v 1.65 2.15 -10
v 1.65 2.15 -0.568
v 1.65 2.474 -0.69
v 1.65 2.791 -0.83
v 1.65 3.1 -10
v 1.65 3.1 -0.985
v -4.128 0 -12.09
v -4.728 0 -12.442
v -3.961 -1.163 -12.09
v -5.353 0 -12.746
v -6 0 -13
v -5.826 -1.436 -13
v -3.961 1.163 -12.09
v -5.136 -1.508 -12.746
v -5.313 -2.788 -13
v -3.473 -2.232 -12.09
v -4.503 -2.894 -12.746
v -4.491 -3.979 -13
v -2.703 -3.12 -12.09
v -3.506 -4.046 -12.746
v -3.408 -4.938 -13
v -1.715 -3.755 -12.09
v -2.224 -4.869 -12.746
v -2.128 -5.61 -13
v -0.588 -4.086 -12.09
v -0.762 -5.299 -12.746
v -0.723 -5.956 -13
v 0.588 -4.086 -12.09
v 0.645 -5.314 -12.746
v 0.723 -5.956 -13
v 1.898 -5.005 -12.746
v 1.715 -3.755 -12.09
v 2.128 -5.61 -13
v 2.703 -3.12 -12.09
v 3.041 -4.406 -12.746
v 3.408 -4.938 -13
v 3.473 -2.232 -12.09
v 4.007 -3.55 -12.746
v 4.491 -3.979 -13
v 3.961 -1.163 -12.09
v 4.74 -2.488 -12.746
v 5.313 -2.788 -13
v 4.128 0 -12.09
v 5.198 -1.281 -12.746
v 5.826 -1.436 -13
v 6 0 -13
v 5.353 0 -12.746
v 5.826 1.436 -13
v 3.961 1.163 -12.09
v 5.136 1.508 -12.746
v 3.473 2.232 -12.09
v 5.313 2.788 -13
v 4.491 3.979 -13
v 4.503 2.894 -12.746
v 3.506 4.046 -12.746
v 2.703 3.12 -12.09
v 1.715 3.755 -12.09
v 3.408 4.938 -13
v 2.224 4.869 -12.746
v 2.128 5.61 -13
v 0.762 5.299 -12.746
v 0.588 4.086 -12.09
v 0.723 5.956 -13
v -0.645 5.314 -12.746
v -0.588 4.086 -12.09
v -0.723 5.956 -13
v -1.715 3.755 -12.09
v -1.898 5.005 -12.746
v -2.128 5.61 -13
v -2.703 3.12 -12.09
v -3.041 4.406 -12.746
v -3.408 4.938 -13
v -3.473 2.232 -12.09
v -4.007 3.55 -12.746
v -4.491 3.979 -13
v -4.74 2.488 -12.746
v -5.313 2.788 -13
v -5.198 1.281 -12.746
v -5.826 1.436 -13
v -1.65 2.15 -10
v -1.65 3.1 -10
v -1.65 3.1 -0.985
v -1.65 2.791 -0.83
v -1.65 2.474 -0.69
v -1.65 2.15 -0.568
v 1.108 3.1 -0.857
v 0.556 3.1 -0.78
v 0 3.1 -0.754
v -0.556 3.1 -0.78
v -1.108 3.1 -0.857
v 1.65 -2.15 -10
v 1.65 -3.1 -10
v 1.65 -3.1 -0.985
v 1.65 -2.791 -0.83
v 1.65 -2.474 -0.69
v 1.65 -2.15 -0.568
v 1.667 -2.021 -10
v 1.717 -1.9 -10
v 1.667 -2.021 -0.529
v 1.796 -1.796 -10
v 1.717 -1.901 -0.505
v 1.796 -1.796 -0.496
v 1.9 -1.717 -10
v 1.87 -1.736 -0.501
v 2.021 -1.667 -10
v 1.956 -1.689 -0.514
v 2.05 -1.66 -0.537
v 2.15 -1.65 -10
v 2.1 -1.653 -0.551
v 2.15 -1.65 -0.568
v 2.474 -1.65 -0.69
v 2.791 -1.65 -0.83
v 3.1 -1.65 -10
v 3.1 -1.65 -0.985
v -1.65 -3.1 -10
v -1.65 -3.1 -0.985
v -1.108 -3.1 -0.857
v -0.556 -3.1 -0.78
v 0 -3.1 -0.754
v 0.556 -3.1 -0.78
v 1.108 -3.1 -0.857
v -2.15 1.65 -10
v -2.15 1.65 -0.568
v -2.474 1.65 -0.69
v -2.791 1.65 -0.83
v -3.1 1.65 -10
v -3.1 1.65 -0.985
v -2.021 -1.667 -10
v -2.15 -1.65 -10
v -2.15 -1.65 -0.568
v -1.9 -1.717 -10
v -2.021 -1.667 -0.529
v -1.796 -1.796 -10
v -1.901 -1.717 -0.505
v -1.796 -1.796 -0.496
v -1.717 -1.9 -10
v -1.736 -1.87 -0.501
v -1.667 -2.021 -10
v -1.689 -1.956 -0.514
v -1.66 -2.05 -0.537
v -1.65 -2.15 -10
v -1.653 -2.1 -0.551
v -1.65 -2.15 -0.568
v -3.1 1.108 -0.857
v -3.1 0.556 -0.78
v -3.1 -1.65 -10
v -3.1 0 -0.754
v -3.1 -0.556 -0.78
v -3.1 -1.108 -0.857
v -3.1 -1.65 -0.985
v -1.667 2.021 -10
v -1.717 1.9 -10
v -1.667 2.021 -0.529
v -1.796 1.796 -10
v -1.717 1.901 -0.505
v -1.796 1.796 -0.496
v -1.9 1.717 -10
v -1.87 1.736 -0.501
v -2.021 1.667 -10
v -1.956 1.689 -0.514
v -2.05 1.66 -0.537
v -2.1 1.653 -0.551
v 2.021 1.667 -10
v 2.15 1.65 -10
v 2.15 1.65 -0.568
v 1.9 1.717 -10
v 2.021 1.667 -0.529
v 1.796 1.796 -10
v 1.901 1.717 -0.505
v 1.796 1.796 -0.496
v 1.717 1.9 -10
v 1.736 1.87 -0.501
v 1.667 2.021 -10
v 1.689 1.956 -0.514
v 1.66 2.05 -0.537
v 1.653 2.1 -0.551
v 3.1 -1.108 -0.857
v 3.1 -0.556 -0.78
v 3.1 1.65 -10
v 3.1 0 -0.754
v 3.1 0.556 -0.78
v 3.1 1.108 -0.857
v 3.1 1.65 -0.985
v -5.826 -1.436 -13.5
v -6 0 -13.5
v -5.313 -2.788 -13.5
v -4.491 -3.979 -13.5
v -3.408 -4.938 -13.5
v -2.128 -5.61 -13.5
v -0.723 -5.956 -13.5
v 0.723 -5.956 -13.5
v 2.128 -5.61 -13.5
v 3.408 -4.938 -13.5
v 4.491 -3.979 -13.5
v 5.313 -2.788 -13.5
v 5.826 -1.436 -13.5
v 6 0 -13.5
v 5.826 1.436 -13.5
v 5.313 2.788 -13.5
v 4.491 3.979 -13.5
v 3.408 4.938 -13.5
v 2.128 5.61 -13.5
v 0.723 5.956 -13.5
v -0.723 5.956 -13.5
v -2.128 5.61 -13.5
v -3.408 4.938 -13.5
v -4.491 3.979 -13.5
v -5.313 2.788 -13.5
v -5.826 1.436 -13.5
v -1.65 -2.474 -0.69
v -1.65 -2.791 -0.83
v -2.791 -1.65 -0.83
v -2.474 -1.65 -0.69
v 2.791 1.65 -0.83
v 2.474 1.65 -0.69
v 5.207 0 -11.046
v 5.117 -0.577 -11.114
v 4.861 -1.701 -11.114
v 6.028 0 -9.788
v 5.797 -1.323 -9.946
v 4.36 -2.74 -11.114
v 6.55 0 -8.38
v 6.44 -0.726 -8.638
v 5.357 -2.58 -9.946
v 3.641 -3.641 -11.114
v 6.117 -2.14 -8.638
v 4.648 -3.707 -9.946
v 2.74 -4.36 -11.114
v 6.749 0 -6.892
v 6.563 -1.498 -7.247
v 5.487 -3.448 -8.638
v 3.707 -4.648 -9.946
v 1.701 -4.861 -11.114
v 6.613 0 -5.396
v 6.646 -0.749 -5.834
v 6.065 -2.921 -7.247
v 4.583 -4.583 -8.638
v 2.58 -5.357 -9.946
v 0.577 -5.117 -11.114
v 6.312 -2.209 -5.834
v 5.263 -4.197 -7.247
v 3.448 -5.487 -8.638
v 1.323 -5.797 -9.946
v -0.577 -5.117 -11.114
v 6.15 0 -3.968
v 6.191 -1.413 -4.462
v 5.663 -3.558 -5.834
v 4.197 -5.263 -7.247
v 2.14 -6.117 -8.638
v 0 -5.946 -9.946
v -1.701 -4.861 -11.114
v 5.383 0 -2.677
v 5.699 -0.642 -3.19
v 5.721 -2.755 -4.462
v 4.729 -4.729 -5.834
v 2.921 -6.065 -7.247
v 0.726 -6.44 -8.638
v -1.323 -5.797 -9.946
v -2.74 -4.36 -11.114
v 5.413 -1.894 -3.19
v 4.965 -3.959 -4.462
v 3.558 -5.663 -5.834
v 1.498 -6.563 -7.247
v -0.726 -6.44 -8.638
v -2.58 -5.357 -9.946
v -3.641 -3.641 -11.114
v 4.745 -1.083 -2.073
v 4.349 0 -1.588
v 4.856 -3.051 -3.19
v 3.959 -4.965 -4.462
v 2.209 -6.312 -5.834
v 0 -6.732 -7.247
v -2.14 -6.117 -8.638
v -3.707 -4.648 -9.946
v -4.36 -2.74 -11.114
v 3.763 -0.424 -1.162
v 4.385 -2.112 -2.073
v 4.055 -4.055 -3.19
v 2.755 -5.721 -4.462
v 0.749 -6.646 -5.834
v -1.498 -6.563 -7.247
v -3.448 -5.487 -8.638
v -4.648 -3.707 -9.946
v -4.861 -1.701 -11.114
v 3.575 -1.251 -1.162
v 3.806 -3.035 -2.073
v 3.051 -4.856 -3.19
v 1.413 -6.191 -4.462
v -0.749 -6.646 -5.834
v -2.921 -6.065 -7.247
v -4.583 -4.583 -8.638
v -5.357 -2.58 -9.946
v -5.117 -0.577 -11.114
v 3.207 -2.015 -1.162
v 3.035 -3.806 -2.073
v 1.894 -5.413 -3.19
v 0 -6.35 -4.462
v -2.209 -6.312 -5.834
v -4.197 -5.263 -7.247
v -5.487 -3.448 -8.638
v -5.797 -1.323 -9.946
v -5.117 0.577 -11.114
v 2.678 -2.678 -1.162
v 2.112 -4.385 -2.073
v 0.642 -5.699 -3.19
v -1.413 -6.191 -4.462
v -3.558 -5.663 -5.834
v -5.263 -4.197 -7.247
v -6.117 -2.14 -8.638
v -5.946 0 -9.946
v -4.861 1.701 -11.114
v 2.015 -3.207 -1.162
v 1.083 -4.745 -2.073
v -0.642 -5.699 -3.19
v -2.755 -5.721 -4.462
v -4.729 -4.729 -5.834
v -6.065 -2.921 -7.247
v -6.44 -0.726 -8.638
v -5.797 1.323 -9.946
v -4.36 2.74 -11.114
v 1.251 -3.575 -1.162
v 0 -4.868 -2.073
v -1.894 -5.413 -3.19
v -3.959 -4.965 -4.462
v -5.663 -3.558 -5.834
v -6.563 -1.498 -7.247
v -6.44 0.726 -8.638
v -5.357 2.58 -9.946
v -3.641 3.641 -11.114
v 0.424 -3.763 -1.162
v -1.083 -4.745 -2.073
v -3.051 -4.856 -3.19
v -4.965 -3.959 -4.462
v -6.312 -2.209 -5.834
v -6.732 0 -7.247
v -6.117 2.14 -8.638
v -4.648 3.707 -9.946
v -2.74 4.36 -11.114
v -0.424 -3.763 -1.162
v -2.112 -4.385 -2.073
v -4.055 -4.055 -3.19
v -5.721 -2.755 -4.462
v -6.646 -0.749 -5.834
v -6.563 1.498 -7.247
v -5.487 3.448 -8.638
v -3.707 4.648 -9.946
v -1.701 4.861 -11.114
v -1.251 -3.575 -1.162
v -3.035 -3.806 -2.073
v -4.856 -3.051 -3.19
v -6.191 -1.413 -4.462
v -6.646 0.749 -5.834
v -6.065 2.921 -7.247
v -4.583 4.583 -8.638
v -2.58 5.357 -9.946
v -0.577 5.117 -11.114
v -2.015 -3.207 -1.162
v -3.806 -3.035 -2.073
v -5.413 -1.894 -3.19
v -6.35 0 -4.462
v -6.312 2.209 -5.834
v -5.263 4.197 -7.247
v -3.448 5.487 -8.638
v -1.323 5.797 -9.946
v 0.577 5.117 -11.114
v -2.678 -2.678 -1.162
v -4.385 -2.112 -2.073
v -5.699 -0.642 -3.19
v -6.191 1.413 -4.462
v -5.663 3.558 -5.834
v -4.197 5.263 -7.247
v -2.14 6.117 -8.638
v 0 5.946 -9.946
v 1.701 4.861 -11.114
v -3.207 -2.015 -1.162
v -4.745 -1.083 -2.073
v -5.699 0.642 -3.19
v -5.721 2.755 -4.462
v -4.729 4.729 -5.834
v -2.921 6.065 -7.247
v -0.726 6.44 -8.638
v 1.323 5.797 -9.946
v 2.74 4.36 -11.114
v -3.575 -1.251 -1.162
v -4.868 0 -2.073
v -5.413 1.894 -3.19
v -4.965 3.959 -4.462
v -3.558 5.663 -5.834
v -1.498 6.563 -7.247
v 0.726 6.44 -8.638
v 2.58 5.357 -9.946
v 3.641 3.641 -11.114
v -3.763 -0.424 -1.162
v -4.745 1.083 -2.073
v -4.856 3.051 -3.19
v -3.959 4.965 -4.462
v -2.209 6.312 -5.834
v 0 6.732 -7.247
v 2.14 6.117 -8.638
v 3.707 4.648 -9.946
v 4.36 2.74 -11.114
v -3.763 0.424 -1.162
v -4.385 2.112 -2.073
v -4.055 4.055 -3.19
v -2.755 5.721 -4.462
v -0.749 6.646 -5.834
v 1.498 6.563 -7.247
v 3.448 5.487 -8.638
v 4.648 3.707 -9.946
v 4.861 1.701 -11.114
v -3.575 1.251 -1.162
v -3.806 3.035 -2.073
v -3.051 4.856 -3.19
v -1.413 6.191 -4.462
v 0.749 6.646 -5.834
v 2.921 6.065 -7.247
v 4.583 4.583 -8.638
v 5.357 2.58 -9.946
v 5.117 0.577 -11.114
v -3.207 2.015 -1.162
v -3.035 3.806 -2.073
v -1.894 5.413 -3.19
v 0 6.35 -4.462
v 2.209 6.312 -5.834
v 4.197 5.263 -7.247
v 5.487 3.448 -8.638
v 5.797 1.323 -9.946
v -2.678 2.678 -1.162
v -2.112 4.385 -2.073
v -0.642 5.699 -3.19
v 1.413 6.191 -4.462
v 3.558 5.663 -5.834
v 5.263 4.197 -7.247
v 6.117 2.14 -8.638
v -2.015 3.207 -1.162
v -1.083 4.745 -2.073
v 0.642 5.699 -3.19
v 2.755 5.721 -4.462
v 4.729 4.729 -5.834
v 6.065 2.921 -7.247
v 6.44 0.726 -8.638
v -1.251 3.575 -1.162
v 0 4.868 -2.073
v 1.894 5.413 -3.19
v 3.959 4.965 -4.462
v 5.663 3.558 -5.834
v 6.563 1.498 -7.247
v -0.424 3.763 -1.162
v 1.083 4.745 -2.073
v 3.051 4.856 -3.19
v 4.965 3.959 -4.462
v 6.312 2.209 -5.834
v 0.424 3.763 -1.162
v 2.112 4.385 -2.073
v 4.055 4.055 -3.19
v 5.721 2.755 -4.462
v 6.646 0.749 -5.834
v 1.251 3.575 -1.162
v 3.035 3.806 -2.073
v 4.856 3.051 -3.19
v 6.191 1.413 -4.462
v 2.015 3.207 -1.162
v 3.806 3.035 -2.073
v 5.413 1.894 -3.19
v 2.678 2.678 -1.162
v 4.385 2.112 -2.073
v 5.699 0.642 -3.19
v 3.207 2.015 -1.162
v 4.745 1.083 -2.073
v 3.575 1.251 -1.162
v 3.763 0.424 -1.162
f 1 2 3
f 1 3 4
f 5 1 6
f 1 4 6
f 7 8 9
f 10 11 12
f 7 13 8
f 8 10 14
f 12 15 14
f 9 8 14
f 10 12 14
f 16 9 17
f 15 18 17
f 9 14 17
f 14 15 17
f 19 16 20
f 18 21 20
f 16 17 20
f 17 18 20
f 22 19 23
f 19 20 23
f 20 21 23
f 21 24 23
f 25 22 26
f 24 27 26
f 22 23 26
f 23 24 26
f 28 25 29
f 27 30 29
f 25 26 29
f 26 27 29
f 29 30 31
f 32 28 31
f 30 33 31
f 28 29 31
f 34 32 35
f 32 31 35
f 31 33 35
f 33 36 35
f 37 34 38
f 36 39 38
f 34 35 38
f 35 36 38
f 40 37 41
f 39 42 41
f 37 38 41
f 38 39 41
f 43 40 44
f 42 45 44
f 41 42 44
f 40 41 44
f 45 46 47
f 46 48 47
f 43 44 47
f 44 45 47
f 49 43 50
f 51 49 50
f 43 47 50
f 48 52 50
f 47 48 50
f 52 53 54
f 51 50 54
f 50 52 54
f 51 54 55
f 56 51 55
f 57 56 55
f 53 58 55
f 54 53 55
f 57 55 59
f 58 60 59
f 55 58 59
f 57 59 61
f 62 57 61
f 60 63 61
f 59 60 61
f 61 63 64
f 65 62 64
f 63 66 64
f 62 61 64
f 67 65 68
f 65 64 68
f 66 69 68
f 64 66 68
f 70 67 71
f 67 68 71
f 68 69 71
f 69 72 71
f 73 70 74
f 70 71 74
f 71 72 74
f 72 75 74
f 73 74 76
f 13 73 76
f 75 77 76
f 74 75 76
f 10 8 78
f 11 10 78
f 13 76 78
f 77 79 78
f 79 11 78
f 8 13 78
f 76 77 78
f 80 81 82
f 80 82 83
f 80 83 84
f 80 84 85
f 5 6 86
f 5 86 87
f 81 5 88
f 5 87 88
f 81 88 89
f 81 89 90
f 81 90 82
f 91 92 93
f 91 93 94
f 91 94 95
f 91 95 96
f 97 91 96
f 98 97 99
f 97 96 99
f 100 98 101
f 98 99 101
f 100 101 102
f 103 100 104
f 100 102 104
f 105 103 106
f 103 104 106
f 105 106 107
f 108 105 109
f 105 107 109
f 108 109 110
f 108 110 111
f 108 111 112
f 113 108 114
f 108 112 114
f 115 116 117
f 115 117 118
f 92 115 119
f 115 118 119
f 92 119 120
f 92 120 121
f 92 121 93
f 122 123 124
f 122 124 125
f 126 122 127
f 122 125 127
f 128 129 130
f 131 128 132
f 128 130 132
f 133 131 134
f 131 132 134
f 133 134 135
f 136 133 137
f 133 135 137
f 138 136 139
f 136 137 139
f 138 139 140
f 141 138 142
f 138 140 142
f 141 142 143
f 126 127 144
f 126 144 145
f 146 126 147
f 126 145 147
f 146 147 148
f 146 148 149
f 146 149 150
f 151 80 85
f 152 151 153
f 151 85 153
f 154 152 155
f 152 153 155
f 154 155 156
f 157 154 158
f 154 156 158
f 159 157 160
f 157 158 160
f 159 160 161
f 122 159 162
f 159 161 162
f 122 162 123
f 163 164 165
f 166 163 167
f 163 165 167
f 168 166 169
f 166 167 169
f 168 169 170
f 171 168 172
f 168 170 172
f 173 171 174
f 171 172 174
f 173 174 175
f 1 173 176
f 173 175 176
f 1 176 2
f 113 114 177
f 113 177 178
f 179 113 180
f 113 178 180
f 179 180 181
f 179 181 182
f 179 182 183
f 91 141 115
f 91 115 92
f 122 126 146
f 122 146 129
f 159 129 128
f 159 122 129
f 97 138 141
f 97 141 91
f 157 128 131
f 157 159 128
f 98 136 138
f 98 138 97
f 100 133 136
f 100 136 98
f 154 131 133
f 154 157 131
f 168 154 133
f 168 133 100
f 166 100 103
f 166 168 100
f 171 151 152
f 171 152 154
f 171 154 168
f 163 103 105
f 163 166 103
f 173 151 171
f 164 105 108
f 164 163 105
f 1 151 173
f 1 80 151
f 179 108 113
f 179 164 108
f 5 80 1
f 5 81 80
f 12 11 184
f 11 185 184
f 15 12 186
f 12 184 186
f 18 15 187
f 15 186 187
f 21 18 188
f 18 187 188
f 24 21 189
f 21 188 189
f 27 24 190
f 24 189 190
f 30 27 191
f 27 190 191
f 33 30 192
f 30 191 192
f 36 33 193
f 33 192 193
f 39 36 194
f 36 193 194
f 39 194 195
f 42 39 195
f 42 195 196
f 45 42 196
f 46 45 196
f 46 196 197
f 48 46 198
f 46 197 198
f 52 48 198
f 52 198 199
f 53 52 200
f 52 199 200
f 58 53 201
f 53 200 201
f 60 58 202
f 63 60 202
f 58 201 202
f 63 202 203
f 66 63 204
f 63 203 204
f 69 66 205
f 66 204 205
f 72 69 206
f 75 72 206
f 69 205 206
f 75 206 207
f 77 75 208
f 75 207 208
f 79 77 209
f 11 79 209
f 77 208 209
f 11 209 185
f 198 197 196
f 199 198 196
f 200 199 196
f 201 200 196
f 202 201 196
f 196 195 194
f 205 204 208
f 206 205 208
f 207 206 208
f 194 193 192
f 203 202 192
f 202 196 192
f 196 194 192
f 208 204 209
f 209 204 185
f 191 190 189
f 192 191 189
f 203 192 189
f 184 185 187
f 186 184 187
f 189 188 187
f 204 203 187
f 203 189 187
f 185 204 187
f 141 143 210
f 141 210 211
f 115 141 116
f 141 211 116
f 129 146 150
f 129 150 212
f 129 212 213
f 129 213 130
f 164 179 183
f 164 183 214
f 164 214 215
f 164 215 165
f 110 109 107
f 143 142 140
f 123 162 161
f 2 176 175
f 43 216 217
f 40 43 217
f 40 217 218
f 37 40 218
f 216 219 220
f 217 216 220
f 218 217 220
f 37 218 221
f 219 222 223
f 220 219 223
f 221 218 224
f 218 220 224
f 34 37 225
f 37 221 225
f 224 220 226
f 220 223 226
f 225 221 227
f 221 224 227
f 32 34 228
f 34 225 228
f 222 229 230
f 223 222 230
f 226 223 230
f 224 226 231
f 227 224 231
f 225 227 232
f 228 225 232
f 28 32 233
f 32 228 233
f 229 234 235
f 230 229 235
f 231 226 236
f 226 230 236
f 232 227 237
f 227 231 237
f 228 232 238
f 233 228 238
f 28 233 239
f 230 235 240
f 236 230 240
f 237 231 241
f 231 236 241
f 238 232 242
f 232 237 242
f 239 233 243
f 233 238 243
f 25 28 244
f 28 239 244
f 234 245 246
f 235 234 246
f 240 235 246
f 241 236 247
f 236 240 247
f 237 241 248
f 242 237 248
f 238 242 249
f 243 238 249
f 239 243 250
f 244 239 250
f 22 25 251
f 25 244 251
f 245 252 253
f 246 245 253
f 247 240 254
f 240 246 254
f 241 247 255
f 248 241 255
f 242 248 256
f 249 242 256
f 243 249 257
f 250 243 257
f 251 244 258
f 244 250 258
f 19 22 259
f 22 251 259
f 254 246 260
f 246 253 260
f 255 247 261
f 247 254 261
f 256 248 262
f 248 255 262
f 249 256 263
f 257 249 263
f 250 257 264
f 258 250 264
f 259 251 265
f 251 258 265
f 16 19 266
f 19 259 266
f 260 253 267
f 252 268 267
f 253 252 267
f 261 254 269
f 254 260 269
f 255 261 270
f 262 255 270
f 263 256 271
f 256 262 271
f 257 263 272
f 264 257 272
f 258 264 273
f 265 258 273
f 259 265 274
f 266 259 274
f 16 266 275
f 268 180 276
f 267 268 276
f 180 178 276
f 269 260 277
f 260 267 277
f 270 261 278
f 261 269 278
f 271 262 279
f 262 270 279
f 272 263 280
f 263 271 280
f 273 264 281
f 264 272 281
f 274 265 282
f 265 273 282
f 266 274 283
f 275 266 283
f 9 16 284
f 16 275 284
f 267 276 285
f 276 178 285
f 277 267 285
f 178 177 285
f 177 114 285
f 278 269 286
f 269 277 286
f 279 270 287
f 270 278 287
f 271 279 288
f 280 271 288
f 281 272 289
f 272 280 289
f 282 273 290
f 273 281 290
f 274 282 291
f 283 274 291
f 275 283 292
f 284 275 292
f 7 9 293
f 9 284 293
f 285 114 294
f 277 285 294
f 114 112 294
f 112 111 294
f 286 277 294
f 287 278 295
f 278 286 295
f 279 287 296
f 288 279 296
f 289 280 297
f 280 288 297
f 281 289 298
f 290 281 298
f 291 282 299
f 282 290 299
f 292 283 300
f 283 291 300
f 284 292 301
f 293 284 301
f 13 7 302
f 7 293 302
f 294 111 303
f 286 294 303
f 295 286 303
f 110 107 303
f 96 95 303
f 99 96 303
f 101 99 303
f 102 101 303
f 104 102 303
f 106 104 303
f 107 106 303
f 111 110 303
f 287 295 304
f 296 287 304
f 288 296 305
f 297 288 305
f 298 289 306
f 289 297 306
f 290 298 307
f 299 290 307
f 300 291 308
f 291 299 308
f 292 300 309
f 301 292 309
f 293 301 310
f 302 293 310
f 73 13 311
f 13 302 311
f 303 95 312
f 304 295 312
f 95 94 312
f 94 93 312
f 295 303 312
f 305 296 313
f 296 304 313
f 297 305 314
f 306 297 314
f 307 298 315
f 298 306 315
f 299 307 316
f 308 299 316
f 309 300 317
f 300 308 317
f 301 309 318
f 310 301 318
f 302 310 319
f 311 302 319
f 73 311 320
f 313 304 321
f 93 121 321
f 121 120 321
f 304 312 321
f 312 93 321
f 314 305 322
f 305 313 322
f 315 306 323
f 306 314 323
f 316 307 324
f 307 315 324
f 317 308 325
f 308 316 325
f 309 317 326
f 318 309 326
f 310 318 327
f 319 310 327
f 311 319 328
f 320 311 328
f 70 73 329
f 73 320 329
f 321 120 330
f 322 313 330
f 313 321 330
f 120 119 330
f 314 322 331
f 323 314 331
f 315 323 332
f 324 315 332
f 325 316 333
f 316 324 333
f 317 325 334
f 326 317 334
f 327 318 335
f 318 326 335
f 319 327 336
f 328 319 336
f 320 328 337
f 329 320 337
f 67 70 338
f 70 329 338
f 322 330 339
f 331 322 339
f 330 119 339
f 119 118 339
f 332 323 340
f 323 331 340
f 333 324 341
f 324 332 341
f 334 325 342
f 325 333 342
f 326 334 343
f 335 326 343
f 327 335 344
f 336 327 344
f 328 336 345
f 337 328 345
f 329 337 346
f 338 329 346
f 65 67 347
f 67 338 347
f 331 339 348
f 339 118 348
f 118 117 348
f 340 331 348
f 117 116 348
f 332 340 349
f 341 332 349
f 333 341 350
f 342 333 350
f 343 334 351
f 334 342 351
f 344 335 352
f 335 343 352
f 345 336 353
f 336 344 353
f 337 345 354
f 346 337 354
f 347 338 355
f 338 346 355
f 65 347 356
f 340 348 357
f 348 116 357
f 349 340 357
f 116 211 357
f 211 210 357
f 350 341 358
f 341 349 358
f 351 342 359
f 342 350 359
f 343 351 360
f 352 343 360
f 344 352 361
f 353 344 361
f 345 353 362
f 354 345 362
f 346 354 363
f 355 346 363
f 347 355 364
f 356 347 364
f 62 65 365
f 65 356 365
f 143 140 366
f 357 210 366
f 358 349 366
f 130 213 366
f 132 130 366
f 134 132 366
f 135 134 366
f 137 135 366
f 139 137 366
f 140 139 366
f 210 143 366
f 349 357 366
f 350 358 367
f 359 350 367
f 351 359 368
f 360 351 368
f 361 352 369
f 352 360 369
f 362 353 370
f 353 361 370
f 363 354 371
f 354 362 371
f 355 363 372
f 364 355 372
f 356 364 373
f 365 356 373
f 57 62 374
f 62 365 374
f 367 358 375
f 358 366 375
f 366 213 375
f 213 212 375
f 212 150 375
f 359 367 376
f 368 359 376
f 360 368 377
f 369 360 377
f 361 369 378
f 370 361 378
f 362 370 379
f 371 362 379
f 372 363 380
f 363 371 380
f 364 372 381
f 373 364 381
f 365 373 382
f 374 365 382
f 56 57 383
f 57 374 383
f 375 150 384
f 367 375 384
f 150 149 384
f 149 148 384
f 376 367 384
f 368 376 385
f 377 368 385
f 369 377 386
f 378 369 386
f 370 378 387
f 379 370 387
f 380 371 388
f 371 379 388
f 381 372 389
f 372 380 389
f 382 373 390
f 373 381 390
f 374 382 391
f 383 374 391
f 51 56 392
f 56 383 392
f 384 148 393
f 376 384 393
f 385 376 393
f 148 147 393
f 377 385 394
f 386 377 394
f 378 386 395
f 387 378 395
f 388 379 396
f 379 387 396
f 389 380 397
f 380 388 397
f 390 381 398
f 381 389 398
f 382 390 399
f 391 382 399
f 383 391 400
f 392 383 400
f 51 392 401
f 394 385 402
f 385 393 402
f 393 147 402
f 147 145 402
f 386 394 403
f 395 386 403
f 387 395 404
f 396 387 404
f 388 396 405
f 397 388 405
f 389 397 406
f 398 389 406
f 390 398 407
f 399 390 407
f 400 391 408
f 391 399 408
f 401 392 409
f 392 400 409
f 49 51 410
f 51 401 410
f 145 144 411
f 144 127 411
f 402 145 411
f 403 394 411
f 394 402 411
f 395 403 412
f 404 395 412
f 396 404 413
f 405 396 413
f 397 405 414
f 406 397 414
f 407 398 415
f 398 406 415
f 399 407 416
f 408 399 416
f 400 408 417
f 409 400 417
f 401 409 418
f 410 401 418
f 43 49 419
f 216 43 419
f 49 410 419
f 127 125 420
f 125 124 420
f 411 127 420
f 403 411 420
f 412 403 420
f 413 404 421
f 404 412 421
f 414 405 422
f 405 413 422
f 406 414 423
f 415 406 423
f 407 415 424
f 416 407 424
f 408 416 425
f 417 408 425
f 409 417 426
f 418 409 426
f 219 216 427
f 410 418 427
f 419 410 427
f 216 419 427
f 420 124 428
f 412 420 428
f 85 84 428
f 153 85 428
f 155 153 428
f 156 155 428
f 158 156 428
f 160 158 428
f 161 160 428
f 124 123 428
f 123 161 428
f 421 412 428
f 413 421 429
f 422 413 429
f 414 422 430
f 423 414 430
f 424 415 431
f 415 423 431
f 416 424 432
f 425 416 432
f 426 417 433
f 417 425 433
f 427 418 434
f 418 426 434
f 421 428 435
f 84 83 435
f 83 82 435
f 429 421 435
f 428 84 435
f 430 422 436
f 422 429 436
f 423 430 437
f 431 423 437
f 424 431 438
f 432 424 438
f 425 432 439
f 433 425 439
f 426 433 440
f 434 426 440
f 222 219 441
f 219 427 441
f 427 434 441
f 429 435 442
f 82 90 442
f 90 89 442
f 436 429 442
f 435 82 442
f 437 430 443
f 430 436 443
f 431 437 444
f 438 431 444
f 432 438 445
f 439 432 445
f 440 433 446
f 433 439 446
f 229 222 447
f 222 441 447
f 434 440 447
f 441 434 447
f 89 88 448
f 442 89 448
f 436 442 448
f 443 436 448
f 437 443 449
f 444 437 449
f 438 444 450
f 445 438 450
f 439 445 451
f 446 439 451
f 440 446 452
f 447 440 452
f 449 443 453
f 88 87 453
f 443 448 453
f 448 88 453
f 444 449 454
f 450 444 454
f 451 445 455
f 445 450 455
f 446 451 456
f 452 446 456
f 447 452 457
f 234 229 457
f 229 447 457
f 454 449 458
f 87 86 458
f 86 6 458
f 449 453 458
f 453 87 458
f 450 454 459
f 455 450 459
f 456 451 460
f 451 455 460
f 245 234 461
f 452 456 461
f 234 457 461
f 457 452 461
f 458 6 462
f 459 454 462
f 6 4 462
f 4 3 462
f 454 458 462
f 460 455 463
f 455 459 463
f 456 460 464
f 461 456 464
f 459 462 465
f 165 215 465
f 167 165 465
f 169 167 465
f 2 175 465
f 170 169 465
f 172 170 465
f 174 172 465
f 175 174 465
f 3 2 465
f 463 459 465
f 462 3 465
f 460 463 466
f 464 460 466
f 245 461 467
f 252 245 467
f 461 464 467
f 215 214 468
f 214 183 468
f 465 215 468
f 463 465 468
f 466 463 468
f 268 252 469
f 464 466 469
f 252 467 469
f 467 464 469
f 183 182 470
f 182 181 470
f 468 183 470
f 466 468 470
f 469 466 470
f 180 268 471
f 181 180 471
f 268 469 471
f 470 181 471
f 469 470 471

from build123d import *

# Parameters (mm, degrees)
F3_DEPTH = 10


with BuildPart() as f1:
    # F0 (on Front) → F1 (revolve)
    with BuildSketch(Plane.XZ):
        with BuildLine():
            Line((0, 0), (0, -13.5))
            ThreePointArc((0, -13.5), (6.75, -6.75), (0, 0))
        make_face()
    revolve(axis=Axis((0, 0, -6.75), (0, 0, -1)))

    # F2 (on Top) → F3 (cut)
    with BuildSketch(Plane.XY):
        with BuildLine():
            Line((-3.1, 1.65), (-3.1, 0))
            Line((-3.1, 0), (-3.1, -1.65))
            Line((-3.1, -1.65), (-2.15, -1.65))
            ThreePointArc((-2.15, -1.65), (-1.796447, -1.796447), (-1.65, -2.15))
            Line((-1.65, -2.15), (-1.65, -3.1))
            Line((-1.65, -3.1), (0, -3.1))
            Line((0, -3.1), (1.65, -3.1))
            Line((1.65, -3.1), (1.65, -2.15))
            ThreePointArc((1.65, -2.15), (1.796447, -1.796447), (2.15, -1.65))
            Line((2.15, -1.65), (3.1, -1.65))
            Line((3.1, -1.65), (3.1, 0))
            Line((3.1, 0), (3.1, 1.65))
            Line((3.1, 1.65), (2.15, 1.65))
            ThreePointArc((2.15, 1.65), (1.796447, 1.796447), (1.65, 2.15))
            Line((1.65, 2.15), (1.65, 3.1))
            Line((1.65, 3.1), (0, 3.1))
            Line((0, 3.1), (-1.65, 3.1))
            Line((-1.65, 3.1), (-1.65, 2.15))
            ThreePointArc((-1.65, 2.15), (-1.796447, 1.796447), (-2.15, 1.65))
            Line((-2.15, 1.65), (-3.1, 1.65))
        make_face()
    extrude(amount=-F3_DEPTH, mode=Mode.SUBTRACT)

    # F4 (on Front) → F5 (revolve)
    with BuildSketch(Plane.XZ):
        with BuildLine():
            Line((-6, -13), (-6, -13.5))
            Line((-6, -13.5), (0, -13.5))
            Line((0, -13.5), (0, -12.090374))
            Line((0, -12.090374), (-4.128305, -12.090374))
            ThreePointArc((-4.128305, -12.090374), (-5.037623, -12.599775), (-6, -13))
        make_face()
    revolve(axis=Axis((0, 0, -12.795187), (0, 0, 1)))


solid = f1.part
